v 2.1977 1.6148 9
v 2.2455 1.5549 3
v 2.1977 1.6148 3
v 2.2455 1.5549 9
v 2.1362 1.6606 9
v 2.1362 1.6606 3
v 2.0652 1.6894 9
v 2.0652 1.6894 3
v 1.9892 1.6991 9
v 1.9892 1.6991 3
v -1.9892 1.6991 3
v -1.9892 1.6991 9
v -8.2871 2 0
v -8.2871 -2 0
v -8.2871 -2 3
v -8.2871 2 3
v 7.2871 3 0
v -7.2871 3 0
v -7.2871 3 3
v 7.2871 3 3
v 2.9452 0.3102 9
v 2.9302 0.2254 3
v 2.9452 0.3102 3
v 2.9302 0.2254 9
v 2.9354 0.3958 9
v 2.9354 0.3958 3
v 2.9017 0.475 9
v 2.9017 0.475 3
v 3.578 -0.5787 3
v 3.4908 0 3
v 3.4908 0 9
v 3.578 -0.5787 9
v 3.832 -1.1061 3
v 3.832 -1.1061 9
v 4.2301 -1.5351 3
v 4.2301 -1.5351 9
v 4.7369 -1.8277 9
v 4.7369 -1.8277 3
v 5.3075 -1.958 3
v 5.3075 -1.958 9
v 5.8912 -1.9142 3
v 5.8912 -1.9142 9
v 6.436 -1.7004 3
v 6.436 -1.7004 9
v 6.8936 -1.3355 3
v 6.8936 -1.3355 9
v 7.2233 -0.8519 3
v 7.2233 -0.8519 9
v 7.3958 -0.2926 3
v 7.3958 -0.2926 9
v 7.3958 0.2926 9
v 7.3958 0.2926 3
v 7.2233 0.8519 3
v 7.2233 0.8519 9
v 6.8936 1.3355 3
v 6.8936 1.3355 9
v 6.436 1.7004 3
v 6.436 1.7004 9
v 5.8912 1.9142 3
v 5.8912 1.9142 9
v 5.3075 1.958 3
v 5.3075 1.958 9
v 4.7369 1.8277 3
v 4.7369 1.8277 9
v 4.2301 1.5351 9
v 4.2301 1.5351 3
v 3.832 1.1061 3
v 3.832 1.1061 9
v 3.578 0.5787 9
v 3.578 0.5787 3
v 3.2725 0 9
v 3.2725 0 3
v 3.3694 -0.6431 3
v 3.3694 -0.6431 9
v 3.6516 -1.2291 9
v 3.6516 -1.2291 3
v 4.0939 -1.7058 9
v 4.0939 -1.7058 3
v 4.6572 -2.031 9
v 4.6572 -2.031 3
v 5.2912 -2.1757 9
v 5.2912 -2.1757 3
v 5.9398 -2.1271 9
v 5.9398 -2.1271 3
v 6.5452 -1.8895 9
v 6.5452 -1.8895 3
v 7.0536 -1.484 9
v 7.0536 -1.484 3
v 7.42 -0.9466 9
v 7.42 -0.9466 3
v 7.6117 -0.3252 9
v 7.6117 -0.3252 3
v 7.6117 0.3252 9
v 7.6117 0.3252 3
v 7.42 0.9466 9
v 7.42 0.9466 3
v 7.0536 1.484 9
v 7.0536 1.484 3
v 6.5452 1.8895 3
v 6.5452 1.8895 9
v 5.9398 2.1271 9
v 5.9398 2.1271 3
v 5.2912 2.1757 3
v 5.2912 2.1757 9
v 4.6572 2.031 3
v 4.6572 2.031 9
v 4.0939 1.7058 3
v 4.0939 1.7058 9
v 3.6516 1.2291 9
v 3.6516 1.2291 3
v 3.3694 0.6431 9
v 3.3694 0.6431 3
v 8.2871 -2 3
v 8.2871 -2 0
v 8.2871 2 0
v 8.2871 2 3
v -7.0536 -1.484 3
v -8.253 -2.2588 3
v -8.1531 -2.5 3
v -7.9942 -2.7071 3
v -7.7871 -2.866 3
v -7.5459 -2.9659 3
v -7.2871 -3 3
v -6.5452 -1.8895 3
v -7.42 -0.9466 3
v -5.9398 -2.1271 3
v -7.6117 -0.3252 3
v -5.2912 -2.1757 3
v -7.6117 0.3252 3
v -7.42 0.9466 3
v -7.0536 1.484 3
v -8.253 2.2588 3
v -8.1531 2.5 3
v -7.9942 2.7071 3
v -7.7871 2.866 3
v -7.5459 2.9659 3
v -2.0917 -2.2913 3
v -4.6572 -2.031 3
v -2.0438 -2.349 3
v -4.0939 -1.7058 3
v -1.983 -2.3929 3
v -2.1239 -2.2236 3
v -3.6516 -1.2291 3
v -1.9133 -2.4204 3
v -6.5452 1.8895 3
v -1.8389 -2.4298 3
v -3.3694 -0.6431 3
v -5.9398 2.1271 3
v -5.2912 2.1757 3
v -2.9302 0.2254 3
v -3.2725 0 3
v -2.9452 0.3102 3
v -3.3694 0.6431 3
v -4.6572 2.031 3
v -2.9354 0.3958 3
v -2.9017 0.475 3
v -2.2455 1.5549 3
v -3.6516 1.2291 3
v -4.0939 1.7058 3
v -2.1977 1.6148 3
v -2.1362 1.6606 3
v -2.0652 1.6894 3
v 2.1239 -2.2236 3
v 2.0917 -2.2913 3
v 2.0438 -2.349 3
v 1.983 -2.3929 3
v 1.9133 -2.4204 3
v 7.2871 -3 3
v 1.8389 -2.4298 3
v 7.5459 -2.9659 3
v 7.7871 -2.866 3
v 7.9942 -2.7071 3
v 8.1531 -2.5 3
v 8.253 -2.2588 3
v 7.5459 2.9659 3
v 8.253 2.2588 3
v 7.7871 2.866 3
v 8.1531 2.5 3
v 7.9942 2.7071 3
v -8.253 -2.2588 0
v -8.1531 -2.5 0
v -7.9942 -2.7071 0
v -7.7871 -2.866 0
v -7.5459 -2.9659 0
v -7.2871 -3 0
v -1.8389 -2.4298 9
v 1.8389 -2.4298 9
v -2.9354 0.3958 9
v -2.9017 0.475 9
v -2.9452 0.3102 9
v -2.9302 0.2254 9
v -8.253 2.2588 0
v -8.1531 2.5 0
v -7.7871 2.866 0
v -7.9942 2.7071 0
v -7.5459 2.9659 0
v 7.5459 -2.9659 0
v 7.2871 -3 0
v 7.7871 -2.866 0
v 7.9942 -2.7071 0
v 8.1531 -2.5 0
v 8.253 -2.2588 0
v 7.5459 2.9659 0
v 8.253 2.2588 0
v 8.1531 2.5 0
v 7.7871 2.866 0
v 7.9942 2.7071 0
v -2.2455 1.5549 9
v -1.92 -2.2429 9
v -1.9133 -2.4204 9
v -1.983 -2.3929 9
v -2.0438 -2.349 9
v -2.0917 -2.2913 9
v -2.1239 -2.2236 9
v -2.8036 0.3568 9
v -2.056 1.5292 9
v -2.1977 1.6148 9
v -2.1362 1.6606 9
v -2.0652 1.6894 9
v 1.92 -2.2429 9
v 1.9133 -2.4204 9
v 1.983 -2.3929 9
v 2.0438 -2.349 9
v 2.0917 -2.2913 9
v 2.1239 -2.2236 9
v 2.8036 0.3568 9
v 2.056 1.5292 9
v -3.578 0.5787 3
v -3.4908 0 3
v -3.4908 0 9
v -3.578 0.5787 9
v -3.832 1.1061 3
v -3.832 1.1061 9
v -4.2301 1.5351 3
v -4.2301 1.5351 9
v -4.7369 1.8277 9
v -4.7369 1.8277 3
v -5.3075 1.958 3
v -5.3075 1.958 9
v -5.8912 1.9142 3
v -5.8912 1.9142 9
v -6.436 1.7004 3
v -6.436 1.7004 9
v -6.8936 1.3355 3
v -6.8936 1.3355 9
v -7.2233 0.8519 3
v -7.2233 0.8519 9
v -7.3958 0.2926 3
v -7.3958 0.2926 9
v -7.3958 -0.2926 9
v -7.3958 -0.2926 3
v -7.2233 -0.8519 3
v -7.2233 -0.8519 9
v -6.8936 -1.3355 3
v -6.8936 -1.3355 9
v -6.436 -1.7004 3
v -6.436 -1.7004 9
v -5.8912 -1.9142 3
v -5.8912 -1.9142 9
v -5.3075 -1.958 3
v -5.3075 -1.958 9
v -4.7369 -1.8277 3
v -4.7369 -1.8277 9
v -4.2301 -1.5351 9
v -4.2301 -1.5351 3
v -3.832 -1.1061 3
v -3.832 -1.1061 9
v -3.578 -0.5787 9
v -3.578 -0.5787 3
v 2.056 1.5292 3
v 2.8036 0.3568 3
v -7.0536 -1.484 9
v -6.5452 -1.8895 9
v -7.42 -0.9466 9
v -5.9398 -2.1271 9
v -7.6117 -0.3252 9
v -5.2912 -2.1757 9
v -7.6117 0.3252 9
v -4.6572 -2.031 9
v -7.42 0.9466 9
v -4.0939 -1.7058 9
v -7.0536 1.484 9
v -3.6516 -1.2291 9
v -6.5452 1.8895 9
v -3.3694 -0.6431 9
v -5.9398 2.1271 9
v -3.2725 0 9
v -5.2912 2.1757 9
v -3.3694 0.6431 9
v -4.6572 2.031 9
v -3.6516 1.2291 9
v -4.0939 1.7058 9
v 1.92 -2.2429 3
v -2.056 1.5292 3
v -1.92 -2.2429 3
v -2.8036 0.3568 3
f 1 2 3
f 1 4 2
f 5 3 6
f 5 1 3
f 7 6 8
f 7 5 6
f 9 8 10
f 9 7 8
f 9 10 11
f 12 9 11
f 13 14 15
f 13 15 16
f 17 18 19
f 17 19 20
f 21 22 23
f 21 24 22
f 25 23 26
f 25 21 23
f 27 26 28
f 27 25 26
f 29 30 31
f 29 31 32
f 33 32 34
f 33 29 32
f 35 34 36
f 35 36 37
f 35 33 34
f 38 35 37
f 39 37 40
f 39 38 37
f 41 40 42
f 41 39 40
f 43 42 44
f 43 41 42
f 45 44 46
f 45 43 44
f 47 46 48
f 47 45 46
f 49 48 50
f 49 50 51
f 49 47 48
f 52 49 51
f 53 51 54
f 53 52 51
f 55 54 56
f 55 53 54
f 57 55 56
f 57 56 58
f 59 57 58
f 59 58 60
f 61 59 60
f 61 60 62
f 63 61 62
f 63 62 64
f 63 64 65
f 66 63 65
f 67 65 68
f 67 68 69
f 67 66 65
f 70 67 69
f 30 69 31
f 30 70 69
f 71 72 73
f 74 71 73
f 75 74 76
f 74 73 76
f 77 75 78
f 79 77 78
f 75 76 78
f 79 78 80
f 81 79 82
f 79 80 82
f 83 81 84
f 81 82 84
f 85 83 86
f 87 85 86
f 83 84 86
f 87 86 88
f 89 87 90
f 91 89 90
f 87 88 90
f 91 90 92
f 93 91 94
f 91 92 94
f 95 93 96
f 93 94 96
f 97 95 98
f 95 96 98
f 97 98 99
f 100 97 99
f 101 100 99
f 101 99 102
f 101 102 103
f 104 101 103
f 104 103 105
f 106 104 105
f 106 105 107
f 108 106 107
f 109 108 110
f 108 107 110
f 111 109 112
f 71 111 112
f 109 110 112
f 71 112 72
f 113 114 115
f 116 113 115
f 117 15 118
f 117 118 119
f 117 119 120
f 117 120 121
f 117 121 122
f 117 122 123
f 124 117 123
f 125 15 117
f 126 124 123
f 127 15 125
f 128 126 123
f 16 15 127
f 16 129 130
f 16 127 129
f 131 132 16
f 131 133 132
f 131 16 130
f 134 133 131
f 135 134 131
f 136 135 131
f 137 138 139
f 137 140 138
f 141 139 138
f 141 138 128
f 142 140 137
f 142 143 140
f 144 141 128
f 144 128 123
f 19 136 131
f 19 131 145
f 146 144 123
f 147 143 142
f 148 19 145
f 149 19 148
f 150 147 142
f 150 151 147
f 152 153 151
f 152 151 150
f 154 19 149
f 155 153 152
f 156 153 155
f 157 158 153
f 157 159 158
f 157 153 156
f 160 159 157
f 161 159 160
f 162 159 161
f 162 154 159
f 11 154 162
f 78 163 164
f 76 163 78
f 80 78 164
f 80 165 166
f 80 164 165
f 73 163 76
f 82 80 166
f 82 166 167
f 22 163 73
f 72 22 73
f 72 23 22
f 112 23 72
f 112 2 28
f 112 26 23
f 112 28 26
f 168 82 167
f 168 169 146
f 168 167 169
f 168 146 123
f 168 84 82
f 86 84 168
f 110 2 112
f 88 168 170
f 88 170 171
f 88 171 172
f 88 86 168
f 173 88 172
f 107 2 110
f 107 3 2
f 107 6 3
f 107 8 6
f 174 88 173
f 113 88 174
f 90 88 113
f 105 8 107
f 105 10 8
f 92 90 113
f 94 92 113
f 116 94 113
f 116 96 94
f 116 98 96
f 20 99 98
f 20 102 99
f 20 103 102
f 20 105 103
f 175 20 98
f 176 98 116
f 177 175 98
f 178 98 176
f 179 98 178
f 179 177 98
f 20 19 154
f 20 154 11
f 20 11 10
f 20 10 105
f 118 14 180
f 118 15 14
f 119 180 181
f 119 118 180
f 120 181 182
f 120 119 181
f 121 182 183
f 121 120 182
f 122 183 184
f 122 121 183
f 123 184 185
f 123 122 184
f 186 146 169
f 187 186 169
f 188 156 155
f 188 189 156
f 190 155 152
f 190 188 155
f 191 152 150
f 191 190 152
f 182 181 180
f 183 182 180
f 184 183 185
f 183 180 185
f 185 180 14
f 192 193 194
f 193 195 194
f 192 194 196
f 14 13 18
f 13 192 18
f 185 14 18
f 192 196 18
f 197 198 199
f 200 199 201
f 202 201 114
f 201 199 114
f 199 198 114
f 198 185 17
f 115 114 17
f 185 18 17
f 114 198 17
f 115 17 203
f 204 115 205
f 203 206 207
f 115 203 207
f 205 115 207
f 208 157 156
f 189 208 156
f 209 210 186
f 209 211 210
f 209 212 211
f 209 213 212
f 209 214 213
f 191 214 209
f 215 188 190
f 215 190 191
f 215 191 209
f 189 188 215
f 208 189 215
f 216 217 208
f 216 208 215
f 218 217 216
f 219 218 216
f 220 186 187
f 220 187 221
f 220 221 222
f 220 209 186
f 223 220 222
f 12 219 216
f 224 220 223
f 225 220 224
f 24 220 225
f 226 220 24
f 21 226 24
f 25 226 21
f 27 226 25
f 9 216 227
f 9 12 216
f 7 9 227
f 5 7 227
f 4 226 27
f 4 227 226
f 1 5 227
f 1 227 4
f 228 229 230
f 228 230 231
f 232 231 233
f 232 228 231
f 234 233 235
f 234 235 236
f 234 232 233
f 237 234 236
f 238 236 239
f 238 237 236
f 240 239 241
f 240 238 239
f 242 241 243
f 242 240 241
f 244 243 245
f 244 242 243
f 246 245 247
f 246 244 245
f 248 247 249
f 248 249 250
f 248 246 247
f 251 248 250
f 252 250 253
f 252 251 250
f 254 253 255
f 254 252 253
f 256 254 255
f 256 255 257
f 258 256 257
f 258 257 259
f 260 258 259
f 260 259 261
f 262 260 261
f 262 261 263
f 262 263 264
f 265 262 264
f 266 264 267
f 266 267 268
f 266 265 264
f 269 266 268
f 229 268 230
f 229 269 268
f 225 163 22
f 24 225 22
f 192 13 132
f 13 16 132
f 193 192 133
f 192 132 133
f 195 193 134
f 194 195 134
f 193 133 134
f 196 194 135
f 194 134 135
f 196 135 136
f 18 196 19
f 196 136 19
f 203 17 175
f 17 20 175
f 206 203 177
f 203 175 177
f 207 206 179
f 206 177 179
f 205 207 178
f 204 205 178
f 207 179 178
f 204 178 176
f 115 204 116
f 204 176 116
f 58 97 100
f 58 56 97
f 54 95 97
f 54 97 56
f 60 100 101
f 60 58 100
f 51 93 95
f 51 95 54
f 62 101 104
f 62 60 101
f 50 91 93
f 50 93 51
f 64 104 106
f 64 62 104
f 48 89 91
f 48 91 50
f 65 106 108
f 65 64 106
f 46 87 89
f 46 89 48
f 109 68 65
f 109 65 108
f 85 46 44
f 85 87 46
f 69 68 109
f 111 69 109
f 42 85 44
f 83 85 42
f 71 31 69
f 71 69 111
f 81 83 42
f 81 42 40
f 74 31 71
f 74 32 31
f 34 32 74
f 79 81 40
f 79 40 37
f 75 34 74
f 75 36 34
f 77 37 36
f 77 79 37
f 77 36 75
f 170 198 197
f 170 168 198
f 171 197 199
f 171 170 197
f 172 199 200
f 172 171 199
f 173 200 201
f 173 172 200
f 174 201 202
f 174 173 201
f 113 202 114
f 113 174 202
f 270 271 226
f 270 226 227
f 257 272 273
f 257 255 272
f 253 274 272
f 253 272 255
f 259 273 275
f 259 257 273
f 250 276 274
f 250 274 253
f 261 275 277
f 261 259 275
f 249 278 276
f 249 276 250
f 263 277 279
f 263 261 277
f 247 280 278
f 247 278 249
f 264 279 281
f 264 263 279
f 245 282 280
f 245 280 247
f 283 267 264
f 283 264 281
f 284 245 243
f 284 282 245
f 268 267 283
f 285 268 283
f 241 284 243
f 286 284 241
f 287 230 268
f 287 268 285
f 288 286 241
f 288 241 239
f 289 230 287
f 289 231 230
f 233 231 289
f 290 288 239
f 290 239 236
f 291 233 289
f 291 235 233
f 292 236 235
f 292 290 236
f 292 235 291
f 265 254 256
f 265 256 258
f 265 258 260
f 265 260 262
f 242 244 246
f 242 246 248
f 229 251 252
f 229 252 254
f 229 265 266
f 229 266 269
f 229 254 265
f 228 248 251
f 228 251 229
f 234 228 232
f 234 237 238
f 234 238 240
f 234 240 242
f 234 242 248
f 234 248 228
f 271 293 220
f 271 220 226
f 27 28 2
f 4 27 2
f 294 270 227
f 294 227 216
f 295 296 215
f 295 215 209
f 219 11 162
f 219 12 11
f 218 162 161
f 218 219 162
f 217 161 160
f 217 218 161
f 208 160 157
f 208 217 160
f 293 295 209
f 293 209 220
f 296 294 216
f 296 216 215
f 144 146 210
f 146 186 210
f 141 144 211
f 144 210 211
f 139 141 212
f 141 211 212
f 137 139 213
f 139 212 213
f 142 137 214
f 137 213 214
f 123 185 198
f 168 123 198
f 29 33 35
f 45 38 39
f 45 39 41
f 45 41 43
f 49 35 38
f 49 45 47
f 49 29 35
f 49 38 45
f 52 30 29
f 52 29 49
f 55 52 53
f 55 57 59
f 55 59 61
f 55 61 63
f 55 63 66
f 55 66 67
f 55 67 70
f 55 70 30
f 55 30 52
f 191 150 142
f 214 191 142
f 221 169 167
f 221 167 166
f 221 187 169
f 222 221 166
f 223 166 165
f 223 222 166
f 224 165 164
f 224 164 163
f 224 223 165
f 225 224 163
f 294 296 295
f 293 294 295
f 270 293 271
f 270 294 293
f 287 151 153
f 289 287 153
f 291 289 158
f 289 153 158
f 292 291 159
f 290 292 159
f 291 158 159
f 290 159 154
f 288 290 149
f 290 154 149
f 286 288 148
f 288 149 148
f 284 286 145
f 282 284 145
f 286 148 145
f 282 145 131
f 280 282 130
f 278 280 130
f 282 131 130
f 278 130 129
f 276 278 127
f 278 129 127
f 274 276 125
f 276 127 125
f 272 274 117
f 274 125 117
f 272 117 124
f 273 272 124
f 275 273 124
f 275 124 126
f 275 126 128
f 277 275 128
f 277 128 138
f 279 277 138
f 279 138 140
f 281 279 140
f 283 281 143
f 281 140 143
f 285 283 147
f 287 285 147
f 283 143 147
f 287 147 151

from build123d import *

# Parameters (mm, degrees)
SKETCH1_W           = 16.57424281
SKETCH1_H           = 6
BOSS_EXTRUDE1_DEPTH = 3
SKETCH2_R           = 2.181797835
SKETCH2_R_2         = 1.963463841
BOSS_EXTRUDE2_DEPTH = 6
FILLET2_R           = 1
FILLET3_R           = 0.3


with BuildPart() as part:
    # Sketch1 → Boss-Extrude1 (new body)
    with BuildSketch(Plane.XY):
        Rectangle(SKETCH1_W, SKETCH1_H)
    extrude(amount=BOSS_EXTRUDE1_DEPTH)

    # Sketch2 → Boss-Extrude2 (add)
    # profile 1 of 3: a face of its own
    with BuildSketch(Plane.XY.offset(3)):
        with Locations((-5.454256394, 0)):
            Circle(SKETCH2_R)
        with Locations((-5.454256394, 0)):
            Circle(SKETCH2_R_2, mode=Mode.SUBTRACT)
    # profile 2 of 3: a face of its own
    with BuildSketch(Plane.XY.offset(3)):
        with Locations(Location((5.454256394, 0, 0), (0, 0, 180))):
            Circle(SKETCH2_R)
        with Locations(Location((5.454256394, 0, 0), (0, 0, 180))):
            Circle(SKETCH2_R_2, mode=Mode.SUBTRACT)
    # profile 3 of 3: a face of its own
    with BuildSketch(Plane.XY.offset(3)):
        Polygon((-2.055965806, -2.429777771), (2.055965806, -2.429777771), (2.973504265, 0.356820512), (2.157914524, 1.699145294), (-2.157914524, 1.699145294), (-2.973504265, 0.356820512), align=None)
        Polygon((-1.920034182, -2.242871788), (1.920034182, -2.242871788), (2.803589735, 0.356820512), (2.055965806, 1.529230765), (-2.055965806, 1.529230765), (-2.803589735, 0.356820512), align=None, mode=Mode.SUBTRACT)
    extrude(amount=BOSS_EXTRUDE2_DEPTH)

    # Fillet2
    fillet2_edges = [part.edges().sort_by_distance(p)[0] for p in [
        (8.287121405, -3, 1.5),
        (-8.287121405, -3, 1.5),
        (-8.287121405, 3, 1.5),
        (8.287121405, 3, 1.5),
    ]]
    fillet(fillet2_edges, radius=FILLET2_R)

    # Fillet3
    fillet3_edges = [part.edges().sort_by_distance(p)[0] for p in [
        (-2.157914524, 1.699145294, 6),
        (-2.973504265, 0.356820512, 6),
        (-2.055965806, -2.429777771, 6),
        (2.055965806, -2.429777771, 6),
        (2.973504265, 0.356820512, 6),
        (2.157914524, 1.699145294, 6),
    ]]
    fillet(fillet3_edges, radius=FILLET3_R)


solid = part.part
